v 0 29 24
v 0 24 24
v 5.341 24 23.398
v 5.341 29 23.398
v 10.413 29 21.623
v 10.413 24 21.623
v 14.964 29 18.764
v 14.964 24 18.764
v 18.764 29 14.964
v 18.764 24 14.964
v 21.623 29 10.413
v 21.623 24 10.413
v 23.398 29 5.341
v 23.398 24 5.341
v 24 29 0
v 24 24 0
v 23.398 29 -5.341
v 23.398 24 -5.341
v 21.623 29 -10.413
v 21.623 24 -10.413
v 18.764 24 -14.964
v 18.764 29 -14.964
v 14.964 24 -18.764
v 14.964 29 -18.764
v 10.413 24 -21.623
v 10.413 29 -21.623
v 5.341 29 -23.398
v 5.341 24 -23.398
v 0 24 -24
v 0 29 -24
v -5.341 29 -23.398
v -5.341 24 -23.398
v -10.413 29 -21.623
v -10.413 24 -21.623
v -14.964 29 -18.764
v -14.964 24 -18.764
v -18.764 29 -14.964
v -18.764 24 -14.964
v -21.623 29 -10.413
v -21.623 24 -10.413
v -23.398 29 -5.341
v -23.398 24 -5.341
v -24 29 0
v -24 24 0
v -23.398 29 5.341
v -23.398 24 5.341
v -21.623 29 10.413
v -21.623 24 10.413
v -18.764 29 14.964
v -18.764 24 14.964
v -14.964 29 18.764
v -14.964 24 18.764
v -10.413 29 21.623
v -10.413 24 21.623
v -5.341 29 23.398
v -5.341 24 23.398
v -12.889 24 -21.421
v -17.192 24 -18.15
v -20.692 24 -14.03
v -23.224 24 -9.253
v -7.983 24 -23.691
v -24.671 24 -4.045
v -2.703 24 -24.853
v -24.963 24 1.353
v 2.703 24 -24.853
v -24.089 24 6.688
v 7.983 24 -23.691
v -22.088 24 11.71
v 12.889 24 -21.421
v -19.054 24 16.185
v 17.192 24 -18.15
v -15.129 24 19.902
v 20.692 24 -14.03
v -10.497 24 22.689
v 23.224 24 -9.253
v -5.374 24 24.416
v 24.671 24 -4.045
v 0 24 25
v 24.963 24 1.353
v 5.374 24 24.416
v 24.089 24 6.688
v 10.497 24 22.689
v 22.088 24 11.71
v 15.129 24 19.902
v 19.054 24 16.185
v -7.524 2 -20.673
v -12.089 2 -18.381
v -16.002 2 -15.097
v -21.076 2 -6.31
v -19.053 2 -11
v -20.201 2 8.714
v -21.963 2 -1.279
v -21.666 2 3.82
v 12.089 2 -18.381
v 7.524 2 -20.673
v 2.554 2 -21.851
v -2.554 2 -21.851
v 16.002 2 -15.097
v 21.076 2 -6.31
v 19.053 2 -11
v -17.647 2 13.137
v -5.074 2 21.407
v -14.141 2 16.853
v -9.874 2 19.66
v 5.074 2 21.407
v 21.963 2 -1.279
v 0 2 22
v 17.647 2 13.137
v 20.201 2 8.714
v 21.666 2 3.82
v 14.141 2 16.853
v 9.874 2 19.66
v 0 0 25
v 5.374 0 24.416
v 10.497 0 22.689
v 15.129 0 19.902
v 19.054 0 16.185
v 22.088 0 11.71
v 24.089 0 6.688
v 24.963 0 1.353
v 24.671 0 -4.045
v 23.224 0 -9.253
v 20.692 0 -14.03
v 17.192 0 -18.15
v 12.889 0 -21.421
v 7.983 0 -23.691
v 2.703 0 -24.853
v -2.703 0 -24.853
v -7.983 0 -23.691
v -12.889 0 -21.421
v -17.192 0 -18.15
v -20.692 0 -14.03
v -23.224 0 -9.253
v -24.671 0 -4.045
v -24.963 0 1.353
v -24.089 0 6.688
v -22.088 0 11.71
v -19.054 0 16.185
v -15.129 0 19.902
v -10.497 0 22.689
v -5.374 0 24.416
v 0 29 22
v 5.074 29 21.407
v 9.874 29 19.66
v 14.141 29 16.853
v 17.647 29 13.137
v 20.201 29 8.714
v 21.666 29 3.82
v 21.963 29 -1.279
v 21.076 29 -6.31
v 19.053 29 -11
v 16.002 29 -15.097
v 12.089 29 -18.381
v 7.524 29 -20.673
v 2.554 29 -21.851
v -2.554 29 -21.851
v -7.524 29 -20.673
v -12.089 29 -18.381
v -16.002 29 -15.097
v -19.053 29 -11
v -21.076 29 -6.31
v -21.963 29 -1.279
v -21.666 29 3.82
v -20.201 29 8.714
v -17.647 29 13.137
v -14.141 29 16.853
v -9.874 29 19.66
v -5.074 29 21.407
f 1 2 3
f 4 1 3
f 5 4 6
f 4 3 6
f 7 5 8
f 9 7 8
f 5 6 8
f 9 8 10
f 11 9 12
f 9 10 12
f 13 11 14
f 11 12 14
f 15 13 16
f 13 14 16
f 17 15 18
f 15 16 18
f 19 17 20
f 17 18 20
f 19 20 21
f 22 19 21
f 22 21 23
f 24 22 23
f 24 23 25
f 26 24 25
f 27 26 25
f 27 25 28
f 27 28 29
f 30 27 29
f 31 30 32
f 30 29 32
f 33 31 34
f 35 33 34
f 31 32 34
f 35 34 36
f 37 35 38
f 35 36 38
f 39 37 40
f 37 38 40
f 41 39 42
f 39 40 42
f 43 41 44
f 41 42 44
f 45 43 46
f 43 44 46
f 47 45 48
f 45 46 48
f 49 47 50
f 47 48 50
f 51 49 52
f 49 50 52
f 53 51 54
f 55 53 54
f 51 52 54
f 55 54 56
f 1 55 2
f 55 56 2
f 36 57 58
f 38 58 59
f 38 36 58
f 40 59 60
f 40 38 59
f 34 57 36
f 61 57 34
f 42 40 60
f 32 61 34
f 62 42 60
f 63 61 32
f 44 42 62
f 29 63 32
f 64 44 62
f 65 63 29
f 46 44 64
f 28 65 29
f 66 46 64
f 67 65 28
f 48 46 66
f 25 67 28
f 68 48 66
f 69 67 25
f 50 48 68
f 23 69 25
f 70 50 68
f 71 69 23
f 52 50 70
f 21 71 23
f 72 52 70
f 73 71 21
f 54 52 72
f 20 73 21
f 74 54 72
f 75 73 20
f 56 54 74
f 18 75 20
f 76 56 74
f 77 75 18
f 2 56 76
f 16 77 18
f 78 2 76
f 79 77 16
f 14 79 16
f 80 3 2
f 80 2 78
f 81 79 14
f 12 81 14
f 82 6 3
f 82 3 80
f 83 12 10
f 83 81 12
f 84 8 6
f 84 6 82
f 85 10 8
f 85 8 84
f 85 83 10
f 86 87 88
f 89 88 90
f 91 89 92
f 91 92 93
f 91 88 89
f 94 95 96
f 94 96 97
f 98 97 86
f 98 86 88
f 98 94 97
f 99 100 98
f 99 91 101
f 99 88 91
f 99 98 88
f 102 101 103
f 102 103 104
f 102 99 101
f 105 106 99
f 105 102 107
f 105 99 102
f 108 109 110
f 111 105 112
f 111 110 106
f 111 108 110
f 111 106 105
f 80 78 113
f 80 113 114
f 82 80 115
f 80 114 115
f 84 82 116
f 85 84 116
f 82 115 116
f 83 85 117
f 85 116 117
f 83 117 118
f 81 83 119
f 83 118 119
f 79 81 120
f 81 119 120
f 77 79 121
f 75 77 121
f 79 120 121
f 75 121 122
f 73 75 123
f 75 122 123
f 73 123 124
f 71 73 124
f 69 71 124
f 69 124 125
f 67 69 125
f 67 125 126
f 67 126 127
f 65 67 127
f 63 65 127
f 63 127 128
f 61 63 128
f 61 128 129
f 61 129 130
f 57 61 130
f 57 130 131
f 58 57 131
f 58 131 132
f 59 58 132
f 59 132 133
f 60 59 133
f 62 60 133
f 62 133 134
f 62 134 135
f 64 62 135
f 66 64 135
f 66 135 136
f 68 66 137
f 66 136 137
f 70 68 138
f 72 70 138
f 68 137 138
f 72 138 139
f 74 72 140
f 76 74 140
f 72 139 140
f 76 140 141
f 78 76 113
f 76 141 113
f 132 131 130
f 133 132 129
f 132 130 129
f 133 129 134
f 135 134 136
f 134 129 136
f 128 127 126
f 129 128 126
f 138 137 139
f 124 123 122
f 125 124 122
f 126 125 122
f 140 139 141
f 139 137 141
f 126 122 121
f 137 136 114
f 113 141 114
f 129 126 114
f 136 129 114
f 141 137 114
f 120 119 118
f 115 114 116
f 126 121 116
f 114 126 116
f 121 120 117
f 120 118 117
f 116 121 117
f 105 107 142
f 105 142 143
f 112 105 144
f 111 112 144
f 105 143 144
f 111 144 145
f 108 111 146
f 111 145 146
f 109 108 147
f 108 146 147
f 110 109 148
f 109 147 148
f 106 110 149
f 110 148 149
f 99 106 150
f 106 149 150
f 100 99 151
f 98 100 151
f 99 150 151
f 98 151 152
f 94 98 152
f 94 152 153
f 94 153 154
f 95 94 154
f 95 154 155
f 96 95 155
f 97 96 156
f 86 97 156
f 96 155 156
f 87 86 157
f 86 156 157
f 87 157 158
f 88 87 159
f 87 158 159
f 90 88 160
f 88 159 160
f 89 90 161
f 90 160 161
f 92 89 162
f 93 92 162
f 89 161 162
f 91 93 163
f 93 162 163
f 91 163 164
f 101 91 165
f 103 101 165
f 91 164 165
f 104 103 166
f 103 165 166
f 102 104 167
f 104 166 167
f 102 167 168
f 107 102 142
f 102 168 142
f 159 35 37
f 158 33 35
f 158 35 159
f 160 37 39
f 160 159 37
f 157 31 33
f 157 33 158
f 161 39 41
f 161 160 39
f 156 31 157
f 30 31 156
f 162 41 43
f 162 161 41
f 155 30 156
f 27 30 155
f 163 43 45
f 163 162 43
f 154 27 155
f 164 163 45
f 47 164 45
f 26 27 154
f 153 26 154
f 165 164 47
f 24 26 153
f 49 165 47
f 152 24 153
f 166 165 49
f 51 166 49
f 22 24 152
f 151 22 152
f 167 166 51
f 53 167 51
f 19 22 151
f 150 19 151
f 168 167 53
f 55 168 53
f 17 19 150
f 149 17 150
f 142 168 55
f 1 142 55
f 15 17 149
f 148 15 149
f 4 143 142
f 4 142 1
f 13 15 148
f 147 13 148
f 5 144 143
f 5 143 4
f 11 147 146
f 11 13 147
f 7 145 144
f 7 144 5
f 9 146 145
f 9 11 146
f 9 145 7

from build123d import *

# Parameters (mm, degrees)
SKETCH1_R           = 25
BOSS_EXTRUDE1_DEPTH = 29
CUT_EXTRUDE1_START  = -5
SKETCH2_R           = 25
SKETCH2_R_2         = 24
CUT_EXTRUDE1_DEPTH  = 5
SKETCH3_R           = 22
CUT_EXTRUDE2_DEPTH  = 27


with BuildPart() as part:
    # Sketch1 → Boss-Extrude1 (new body)
    with BuildSketch(Plane(origin=(0, 0, 0), x_dir=(1, 0, 0), z_dir=(0, 1, 0))):
        with Locations(Location((0, 0, 0), (0, 0, 270))):
            Circle(SKETCH1_R)
    extrude(amount=BOSS_EXTRUDE1_DEPTH)

    # Sketch2 → Cut-Extrude1 (cut)
    with BuildSketch(Plane(origin=(0, 29, 0), x_dir=(1, 0, 0), z_dir=(0, 1, 0)).offset(CUT_EXTRUDE1_START)):
        with Locations(Location((0, 0, 0), (0, 0, 270))):
            Circle(SKETCH2_R)
        with Locations(Location((0, 0, 0), (0, 0, 270))):
            Circle(SKETCH2_R_2, mode=Mode.SUBTRACT)
    extrude(amount=CUT_EXTRUDE1_DEPTH, mode=Mode.SUBTRACT)

    # Sketch3 → Cut-Extrude2 (cut)
    with BuildSketch(Plane(origin=(0, 29, 0), x_dir=(1, 0, 0), z_dir=(0, 1, 0))):
        with Locations(Location((0, 0, 0), (0, 0, 270))):
            Circle(SKETCH3_R)
    extrude(amount=-CUT_EXTRUDE2_DEPTH, mode=Mode.SUBTRACT)


solid = part.part
